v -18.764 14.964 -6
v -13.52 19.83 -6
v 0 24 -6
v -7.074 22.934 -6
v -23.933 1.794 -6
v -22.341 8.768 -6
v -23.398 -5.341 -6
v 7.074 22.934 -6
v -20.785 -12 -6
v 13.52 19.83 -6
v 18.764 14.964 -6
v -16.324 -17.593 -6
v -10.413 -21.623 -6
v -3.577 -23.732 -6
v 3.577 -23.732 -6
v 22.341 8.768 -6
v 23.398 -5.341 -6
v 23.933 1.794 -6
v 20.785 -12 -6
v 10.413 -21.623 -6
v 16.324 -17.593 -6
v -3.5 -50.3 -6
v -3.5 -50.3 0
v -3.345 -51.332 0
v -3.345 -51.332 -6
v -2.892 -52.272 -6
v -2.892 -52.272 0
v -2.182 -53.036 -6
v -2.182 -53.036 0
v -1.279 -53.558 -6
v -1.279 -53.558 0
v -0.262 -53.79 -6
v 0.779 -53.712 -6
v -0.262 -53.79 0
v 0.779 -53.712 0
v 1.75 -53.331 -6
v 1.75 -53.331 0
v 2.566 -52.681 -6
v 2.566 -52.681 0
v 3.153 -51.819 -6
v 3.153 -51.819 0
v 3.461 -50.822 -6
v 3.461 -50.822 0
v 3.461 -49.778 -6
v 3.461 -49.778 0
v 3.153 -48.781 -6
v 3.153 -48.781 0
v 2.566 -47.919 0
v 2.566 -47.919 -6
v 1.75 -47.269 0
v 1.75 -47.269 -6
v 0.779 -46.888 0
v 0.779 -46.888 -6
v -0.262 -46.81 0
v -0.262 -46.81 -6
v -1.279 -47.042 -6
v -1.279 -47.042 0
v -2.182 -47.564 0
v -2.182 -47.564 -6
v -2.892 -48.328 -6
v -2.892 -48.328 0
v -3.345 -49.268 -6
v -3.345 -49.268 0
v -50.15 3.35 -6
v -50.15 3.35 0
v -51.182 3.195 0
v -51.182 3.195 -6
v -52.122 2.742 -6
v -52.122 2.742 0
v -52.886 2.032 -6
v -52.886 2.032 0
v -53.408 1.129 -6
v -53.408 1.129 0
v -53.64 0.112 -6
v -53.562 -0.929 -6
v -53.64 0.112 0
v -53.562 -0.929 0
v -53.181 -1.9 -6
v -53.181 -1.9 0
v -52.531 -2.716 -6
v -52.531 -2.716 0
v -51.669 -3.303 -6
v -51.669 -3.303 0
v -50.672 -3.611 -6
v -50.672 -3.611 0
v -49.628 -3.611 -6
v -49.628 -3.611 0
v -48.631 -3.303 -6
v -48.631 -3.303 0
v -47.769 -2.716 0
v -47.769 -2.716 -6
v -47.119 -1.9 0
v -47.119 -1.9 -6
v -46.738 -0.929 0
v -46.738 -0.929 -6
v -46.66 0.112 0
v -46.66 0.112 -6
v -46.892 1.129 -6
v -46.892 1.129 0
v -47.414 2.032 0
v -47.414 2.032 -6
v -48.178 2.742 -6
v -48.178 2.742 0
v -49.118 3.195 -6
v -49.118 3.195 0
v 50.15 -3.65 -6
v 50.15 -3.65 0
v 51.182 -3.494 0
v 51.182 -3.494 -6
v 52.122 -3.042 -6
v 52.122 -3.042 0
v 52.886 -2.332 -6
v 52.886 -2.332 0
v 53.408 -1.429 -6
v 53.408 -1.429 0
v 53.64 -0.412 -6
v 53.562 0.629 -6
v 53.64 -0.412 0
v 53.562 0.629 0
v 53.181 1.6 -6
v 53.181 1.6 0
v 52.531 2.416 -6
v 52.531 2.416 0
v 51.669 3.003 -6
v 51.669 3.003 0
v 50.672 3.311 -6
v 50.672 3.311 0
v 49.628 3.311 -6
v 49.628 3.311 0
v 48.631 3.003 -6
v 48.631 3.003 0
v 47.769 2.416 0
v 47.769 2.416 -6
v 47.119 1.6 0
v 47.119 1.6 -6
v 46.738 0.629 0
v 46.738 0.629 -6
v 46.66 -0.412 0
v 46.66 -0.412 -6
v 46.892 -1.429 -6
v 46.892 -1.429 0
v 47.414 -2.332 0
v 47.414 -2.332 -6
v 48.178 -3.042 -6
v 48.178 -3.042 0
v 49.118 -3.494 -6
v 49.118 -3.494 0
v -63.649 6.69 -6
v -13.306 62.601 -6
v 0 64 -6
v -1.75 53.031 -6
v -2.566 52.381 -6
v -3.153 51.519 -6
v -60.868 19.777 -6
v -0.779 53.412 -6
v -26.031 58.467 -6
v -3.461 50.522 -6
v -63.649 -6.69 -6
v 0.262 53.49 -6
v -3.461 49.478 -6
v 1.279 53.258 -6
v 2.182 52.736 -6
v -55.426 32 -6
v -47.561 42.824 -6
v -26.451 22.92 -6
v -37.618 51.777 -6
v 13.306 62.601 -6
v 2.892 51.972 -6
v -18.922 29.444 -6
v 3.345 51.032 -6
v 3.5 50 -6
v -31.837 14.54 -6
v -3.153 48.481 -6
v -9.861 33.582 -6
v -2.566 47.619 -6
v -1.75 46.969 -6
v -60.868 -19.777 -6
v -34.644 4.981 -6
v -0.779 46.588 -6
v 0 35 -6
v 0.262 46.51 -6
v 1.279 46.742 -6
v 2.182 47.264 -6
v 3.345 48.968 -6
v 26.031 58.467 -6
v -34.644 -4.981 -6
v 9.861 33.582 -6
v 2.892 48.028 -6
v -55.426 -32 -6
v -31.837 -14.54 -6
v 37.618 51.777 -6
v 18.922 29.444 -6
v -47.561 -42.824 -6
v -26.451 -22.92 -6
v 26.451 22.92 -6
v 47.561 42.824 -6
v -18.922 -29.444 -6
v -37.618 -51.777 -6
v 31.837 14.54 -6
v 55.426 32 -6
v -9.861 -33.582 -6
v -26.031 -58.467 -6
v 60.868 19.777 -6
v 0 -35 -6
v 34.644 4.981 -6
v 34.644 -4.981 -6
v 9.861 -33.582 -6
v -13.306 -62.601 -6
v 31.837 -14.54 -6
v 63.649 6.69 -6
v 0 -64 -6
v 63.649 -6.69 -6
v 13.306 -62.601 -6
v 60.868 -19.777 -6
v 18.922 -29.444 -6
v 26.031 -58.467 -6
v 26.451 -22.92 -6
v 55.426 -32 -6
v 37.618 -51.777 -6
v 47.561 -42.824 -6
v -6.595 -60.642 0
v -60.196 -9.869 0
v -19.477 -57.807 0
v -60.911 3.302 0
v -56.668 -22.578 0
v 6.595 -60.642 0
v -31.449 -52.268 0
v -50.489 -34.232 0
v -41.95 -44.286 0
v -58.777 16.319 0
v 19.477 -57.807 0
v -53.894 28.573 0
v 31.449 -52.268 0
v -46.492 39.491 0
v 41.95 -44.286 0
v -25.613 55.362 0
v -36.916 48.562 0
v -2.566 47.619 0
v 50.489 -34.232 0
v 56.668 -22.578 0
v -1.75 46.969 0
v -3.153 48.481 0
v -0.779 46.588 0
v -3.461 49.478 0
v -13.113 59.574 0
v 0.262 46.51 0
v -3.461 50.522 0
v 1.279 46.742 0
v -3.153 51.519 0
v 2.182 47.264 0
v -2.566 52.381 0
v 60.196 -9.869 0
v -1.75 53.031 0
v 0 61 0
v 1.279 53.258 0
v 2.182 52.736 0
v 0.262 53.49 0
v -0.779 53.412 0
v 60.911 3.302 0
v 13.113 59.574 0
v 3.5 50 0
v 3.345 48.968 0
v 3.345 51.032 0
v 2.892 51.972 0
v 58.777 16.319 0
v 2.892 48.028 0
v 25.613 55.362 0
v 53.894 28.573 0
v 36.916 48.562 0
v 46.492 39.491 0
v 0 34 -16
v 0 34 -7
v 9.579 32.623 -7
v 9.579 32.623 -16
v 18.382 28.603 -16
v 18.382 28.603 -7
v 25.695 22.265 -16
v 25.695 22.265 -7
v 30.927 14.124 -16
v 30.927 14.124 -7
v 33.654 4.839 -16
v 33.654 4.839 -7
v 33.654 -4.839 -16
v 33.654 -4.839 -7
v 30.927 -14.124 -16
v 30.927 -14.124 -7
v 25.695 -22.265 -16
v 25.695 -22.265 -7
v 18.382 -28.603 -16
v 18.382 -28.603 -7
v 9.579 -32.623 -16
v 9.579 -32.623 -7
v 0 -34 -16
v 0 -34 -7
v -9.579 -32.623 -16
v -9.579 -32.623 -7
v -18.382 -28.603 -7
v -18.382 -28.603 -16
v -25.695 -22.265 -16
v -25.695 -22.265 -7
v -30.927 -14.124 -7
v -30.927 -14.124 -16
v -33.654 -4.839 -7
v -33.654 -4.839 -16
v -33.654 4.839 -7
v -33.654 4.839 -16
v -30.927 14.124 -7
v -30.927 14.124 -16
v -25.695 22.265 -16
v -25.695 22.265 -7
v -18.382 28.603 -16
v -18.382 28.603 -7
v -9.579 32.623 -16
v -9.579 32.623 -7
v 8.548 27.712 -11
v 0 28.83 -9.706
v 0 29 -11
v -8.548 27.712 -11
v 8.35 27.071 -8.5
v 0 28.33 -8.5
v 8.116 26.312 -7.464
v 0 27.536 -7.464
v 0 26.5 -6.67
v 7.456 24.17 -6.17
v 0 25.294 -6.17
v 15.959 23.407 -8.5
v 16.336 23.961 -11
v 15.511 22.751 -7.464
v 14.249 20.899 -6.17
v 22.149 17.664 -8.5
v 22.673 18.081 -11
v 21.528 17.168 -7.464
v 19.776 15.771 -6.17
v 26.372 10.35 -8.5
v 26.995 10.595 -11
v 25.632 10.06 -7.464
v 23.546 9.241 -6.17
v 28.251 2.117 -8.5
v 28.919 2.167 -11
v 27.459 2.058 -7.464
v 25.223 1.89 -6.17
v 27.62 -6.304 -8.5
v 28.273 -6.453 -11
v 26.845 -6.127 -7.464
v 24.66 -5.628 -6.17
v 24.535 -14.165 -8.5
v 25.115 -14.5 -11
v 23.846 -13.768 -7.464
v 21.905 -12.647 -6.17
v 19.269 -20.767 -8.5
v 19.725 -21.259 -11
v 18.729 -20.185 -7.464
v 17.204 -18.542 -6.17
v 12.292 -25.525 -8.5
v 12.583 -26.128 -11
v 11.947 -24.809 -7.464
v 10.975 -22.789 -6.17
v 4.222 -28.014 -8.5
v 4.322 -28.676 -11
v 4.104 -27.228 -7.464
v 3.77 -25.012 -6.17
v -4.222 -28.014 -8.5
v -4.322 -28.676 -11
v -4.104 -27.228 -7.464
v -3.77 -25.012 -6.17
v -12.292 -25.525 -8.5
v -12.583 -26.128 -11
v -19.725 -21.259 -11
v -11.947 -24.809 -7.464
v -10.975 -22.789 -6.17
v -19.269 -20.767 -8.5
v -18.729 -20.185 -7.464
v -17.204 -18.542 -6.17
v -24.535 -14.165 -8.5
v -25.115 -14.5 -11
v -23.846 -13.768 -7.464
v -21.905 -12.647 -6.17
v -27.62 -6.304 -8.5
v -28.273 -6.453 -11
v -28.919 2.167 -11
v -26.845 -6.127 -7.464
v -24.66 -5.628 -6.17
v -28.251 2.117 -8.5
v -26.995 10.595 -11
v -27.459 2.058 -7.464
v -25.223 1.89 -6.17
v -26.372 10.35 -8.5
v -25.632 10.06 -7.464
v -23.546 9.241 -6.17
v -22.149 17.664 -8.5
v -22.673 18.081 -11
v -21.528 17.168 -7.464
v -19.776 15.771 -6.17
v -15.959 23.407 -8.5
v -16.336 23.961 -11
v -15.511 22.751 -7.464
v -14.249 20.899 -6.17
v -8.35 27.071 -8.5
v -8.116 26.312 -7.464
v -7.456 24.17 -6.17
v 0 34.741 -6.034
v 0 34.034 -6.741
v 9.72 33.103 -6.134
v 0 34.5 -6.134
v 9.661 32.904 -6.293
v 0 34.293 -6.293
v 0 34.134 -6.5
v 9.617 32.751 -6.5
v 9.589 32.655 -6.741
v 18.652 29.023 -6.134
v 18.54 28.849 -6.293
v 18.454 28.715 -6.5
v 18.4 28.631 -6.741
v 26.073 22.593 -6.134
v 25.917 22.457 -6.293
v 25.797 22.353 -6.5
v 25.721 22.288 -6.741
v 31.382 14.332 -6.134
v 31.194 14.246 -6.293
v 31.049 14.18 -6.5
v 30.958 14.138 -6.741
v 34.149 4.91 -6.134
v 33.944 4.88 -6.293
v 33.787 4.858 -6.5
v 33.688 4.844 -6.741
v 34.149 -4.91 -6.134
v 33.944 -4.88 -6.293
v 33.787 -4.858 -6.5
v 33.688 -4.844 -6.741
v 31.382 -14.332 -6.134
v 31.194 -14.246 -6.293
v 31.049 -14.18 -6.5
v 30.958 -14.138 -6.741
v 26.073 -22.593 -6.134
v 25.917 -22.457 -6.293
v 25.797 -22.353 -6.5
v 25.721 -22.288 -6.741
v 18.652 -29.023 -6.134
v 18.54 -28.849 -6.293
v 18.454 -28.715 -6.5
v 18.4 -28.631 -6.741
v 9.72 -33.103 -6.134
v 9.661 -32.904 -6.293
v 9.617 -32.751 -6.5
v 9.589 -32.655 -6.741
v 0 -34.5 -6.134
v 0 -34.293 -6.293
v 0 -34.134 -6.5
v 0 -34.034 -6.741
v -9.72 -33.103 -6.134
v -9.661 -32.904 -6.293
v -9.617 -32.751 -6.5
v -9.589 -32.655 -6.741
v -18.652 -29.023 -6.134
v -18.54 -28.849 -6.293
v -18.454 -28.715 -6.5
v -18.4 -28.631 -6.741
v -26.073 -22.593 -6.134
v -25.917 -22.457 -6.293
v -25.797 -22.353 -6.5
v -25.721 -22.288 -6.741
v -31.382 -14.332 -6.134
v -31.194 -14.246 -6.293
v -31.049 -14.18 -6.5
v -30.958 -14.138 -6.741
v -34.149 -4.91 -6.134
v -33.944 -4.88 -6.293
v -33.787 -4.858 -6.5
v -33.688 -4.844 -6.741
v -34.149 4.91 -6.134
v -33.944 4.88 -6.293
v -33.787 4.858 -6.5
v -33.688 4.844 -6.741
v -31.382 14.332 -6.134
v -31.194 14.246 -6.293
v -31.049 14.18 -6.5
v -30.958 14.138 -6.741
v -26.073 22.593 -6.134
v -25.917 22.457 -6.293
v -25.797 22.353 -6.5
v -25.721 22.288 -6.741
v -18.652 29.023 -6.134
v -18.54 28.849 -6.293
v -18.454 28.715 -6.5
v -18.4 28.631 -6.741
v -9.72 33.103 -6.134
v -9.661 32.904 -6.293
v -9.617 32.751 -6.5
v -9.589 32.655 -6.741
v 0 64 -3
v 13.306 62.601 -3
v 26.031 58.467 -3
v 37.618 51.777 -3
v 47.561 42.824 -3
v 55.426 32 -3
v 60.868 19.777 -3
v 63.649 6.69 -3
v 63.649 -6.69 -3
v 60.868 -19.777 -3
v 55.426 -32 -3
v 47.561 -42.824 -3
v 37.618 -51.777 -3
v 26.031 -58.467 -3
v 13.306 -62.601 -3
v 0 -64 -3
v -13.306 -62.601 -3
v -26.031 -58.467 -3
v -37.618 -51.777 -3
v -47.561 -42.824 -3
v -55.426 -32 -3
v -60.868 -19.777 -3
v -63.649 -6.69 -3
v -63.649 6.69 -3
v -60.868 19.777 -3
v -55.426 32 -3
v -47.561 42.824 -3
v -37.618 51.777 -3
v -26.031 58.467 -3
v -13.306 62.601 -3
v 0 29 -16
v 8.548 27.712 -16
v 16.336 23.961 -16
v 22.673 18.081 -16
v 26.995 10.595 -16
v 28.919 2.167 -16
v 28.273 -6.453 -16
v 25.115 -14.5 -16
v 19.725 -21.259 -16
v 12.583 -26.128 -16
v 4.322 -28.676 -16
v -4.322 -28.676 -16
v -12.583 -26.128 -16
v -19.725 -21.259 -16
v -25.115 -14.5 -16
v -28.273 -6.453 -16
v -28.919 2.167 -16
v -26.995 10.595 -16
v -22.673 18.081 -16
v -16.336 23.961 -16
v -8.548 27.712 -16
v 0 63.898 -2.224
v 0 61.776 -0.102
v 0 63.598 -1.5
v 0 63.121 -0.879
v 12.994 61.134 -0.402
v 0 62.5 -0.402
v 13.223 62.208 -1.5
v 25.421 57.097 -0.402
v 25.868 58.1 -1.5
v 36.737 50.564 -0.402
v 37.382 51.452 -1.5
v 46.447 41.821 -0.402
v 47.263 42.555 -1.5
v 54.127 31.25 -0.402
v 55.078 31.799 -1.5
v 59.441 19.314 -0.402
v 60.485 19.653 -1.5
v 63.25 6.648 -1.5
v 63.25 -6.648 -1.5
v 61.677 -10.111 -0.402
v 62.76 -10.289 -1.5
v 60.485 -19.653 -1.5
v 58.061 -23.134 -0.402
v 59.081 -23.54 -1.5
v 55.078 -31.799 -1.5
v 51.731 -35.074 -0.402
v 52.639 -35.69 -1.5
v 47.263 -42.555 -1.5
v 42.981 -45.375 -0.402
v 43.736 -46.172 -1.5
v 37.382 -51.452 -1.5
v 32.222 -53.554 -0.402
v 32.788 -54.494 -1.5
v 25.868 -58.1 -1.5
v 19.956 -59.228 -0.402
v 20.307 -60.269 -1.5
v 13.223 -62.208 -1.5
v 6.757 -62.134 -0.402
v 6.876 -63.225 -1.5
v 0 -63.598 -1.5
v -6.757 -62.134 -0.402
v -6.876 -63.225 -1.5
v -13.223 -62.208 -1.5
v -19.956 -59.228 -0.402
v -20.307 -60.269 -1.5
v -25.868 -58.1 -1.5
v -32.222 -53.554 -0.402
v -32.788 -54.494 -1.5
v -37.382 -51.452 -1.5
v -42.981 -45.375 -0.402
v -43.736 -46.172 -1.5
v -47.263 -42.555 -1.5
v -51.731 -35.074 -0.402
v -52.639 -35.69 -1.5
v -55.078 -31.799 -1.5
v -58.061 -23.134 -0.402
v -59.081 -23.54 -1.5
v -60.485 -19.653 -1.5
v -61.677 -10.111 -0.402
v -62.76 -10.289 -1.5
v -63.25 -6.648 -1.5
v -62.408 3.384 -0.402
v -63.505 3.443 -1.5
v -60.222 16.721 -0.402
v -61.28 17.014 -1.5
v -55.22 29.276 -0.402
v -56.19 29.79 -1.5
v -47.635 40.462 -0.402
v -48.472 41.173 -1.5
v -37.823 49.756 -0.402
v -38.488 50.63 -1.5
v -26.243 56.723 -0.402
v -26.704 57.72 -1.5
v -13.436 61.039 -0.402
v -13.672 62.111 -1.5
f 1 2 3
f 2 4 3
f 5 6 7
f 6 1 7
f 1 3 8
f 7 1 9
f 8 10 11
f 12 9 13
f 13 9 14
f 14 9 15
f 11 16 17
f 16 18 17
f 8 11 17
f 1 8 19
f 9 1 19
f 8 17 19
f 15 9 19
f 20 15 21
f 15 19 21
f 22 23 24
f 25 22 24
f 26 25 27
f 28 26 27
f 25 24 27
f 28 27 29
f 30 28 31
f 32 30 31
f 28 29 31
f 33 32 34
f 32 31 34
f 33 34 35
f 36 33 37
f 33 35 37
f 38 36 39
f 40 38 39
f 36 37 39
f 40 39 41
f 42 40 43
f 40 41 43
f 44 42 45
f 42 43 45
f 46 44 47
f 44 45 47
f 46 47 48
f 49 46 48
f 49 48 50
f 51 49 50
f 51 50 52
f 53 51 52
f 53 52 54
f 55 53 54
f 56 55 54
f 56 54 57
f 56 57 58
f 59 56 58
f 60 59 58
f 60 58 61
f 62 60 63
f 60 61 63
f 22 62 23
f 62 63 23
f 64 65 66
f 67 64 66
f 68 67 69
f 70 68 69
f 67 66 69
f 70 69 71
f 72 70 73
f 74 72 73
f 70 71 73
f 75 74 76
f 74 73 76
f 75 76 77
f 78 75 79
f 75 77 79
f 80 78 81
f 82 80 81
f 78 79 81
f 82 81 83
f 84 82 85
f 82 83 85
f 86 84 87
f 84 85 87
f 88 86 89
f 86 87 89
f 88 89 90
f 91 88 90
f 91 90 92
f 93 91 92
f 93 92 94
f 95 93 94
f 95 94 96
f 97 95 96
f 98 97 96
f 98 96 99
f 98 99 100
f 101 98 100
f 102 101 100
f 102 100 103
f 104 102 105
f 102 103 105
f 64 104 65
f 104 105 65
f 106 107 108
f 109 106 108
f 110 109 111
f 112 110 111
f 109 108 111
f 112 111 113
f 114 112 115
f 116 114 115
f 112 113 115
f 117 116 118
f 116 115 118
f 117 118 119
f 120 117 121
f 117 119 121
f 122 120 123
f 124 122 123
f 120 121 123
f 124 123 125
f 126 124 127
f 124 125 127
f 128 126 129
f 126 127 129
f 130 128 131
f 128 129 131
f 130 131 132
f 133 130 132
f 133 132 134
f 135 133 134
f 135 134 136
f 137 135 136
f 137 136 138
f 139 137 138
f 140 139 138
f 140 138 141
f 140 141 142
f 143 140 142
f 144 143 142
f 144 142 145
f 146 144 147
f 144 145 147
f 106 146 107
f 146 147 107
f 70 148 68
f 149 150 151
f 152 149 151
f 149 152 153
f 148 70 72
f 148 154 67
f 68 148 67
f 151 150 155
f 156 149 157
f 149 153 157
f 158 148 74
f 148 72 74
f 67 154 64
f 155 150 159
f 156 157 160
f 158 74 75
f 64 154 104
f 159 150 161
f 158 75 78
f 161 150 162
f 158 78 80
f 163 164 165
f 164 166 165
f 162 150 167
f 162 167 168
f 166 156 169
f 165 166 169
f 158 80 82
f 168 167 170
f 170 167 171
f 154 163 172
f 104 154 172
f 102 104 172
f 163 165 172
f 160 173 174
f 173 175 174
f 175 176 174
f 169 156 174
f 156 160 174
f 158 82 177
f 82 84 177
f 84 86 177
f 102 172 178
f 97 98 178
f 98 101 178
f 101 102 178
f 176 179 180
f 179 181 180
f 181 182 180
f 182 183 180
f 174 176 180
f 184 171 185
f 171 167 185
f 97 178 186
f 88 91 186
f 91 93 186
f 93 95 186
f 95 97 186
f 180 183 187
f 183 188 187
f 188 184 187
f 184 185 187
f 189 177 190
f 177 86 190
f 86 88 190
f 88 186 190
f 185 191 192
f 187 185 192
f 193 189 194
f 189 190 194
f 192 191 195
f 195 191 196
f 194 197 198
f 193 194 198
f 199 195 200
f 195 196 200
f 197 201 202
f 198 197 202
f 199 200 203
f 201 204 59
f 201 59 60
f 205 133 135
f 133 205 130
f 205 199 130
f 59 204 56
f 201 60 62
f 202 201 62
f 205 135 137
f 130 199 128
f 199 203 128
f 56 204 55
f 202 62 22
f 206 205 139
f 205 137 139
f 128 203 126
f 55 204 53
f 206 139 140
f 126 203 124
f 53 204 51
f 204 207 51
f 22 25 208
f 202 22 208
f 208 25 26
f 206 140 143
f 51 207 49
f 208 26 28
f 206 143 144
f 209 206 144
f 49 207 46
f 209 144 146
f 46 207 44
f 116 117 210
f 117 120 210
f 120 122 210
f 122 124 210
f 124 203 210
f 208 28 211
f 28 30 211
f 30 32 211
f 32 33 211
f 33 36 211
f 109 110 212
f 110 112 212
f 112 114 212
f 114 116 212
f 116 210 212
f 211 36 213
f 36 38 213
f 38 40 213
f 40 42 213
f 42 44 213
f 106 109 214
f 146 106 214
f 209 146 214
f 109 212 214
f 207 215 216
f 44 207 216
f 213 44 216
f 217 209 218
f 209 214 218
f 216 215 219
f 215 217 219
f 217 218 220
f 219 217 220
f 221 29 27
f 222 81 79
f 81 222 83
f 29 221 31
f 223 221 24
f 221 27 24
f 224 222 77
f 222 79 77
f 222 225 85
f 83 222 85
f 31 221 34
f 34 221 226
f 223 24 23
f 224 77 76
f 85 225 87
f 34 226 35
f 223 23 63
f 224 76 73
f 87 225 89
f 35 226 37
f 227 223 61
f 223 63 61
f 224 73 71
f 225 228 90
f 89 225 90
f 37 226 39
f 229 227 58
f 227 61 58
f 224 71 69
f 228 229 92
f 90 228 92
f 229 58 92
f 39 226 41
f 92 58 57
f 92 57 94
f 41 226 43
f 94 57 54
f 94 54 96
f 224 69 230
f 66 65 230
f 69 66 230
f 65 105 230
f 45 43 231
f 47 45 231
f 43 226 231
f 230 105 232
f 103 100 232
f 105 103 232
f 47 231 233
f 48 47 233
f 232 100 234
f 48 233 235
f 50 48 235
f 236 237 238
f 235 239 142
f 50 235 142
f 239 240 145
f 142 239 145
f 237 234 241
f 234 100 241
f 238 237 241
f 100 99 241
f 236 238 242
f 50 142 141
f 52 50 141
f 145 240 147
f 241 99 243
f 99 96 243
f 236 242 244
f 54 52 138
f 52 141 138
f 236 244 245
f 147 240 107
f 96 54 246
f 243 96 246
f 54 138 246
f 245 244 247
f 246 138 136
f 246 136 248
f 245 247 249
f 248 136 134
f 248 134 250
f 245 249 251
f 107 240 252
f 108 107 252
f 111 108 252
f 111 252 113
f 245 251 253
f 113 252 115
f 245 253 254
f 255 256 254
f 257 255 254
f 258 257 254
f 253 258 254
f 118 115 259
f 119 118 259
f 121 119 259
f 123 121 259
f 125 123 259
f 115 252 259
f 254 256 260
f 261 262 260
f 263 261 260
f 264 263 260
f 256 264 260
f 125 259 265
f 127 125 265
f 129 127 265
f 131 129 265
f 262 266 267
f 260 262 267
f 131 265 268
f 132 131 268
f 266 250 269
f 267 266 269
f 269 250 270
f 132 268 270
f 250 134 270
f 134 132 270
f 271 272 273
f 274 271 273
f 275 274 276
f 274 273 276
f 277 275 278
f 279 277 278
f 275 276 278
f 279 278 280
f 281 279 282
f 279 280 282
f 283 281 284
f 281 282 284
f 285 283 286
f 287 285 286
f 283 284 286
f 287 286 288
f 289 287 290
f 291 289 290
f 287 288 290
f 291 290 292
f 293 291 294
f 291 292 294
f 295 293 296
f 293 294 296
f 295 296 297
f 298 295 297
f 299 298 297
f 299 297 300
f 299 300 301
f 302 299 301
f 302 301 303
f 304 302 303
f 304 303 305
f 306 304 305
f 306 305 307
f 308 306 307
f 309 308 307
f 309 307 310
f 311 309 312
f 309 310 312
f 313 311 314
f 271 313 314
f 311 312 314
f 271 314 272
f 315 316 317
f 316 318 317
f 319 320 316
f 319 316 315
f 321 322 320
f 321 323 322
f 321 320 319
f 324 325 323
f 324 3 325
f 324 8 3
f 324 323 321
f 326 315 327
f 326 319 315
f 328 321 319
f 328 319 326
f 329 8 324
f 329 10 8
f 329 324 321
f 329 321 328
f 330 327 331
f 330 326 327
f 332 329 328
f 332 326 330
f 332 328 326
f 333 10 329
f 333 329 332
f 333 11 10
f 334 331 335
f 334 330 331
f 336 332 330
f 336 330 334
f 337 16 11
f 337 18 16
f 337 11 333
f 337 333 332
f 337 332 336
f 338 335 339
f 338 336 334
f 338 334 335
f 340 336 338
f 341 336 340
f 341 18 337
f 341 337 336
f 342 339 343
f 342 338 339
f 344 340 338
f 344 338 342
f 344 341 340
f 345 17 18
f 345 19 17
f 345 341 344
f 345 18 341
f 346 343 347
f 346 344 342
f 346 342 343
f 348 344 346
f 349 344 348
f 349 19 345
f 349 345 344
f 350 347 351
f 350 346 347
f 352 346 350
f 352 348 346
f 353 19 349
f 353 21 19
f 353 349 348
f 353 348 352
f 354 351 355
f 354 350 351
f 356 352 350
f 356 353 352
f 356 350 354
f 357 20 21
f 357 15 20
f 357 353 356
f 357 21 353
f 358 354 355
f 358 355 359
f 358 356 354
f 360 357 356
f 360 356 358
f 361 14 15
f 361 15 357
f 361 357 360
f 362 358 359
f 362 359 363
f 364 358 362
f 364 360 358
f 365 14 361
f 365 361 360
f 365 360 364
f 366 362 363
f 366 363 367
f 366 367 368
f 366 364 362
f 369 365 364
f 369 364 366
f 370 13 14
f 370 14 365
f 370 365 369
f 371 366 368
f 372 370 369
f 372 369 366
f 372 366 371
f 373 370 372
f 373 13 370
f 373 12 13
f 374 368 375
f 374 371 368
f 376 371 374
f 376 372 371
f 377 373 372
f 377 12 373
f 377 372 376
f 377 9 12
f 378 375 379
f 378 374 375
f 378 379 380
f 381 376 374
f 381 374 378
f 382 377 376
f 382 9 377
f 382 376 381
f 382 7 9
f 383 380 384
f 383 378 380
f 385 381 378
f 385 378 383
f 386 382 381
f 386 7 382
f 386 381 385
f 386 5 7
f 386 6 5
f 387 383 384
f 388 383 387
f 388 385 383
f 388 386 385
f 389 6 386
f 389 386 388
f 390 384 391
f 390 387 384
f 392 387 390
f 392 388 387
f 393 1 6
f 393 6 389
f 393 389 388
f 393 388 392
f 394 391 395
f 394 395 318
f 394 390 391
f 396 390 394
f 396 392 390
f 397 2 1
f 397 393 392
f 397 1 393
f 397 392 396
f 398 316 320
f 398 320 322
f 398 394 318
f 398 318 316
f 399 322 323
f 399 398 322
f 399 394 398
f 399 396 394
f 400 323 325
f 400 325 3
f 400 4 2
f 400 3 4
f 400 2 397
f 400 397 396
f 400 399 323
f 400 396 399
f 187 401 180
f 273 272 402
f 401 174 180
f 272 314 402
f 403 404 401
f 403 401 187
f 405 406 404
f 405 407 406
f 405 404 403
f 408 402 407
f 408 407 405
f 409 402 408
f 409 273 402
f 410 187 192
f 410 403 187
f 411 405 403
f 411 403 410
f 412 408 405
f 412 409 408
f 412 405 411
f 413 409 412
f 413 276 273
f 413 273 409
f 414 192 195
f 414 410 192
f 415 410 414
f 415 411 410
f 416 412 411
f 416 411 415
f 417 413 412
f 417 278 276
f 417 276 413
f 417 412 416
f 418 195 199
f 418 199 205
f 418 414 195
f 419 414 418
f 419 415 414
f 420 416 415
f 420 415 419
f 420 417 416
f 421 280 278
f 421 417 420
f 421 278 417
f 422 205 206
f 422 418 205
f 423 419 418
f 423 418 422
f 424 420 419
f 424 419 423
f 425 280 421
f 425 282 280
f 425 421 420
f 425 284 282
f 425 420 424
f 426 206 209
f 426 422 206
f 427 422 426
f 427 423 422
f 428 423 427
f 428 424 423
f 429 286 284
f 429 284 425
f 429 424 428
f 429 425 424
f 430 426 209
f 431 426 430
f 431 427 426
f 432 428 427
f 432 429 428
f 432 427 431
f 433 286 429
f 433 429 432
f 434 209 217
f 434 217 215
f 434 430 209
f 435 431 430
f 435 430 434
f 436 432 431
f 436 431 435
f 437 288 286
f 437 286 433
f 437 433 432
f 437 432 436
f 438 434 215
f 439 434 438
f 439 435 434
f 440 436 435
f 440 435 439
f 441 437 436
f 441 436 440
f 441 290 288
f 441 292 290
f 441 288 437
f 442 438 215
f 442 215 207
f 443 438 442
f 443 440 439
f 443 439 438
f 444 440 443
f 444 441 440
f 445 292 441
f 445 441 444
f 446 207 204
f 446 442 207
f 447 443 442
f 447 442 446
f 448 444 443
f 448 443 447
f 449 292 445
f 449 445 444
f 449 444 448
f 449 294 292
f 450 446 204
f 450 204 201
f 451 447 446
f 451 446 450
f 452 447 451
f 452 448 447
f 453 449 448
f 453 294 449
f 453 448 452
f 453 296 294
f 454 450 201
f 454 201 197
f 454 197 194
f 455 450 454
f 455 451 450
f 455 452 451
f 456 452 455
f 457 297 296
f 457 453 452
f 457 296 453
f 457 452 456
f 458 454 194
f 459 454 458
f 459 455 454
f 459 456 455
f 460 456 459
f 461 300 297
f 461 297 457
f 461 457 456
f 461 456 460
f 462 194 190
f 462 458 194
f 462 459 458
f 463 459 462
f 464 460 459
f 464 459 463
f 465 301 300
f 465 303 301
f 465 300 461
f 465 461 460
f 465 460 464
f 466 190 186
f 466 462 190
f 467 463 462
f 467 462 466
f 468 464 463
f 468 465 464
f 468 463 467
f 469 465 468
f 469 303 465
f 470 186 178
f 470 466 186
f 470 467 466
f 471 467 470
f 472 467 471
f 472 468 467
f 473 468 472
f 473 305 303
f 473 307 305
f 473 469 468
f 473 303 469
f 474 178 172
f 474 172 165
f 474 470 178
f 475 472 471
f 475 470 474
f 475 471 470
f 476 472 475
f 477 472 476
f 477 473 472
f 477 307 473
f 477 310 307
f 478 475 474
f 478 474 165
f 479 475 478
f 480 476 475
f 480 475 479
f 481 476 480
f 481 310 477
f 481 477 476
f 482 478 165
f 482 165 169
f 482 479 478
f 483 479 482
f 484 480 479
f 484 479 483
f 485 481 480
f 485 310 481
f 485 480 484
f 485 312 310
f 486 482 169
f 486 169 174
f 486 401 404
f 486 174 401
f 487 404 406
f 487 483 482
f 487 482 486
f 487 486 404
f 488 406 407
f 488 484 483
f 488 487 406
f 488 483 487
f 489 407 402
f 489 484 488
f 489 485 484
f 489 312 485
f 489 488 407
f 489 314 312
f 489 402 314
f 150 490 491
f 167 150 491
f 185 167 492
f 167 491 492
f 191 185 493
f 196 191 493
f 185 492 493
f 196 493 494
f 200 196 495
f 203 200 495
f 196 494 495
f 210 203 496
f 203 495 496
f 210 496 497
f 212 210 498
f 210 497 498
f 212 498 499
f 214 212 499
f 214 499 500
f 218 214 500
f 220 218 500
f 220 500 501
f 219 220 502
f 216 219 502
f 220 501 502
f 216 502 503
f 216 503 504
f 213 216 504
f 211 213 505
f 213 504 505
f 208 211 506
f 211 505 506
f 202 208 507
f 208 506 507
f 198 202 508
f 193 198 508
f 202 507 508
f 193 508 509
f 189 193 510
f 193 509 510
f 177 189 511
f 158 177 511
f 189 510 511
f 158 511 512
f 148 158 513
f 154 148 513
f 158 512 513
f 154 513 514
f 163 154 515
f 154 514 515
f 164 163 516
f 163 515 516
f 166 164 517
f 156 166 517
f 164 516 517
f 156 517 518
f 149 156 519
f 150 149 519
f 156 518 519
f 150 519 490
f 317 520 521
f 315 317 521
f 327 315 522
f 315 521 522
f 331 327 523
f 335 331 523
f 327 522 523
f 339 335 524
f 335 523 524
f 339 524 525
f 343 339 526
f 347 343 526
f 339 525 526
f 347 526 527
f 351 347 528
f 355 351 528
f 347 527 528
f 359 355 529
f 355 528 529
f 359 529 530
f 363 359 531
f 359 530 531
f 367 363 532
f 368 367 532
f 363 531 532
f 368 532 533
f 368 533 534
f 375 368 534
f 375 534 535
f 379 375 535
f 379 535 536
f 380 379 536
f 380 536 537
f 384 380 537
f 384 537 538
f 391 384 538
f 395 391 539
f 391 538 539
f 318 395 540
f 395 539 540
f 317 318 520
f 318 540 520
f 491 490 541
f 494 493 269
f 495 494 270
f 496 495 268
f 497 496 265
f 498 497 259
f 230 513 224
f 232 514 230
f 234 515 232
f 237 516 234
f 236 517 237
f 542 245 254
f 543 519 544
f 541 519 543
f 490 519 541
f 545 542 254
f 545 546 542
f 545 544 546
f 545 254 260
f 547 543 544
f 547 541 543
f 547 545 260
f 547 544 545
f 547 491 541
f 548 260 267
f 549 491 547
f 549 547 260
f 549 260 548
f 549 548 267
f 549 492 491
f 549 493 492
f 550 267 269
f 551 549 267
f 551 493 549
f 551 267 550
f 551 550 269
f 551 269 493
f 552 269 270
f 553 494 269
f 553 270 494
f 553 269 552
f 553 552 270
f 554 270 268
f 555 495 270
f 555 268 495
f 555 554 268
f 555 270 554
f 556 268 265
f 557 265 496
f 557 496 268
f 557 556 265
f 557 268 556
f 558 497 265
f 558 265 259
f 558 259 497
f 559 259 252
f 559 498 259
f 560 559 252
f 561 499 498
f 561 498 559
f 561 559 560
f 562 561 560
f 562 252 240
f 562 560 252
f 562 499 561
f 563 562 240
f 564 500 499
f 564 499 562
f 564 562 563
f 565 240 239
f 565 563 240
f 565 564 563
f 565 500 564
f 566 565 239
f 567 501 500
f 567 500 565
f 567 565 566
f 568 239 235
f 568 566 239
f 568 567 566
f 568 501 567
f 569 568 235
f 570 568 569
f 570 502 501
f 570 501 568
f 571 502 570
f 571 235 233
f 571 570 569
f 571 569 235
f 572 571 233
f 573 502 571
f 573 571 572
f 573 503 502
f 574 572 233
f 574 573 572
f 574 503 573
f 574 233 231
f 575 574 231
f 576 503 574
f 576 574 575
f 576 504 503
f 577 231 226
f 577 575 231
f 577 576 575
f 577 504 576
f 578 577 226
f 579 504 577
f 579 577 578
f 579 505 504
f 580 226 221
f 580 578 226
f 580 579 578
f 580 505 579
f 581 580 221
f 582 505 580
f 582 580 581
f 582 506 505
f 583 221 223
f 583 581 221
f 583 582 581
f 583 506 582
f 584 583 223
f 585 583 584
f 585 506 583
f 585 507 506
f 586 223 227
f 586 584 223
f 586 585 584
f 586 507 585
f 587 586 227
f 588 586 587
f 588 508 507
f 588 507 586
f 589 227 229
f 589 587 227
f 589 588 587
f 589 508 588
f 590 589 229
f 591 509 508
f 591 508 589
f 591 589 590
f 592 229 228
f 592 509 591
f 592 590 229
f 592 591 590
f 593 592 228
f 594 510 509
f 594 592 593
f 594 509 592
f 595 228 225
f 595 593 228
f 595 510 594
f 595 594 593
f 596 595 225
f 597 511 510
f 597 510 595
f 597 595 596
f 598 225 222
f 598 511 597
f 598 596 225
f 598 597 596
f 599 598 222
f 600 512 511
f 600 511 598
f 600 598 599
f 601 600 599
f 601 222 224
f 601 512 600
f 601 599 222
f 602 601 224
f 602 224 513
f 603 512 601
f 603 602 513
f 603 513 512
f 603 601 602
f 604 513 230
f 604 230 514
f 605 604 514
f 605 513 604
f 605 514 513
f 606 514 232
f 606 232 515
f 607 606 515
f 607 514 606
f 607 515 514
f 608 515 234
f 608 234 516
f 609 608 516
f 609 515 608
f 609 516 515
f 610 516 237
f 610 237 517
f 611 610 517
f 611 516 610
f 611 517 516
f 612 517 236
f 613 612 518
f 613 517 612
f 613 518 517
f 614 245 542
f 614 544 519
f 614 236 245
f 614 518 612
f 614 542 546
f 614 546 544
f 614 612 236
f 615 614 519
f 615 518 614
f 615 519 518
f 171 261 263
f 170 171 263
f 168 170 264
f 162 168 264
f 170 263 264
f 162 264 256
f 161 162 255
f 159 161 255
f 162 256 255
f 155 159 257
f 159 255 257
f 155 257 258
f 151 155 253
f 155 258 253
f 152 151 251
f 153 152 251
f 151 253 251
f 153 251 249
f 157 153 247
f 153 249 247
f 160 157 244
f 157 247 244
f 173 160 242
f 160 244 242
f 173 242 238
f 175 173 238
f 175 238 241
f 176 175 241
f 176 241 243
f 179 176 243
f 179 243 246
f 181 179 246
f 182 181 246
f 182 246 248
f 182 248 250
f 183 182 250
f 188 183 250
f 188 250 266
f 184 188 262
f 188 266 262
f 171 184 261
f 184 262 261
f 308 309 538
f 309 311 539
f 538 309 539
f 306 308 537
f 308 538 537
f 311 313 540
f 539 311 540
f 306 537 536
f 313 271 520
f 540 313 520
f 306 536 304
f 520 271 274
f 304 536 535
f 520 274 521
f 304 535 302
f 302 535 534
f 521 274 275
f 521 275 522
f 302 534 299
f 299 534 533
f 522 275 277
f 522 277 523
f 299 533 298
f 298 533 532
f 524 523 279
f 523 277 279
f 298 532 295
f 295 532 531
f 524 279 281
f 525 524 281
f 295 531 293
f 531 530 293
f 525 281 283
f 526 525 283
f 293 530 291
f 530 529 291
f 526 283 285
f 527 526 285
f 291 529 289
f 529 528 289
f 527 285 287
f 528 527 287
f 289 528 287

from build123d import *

# Parameters (mm, degrees)
SKICA2_R                 = 3.5
ODEBRAT_VYSUNUT_M1_DEPTH = 6
KRUHOV_POLE1_COUNT       = 4
ZAOBLIT1_R               = 3
ZAOBLIT2_R               = 1
ZAOBLIT3_R               = 5


with BuildPart() as part:
    # Skica1 → Rotovat1 (revolve)
    with BuildSketch(Plane(origin=(0, 0, 0), x_dir=(0, 0, -1), z_dir=(1, 0, 0))):
        Polygon((0, 64), (0, 0), (6, 0), (6, 29), (16, 29), (16, 34), (6, 34), (6, 64), align=None)
    revolve(axis=Axis((0, 0, 30.782343988), (0, 0, -1)))

    # Skica2 → Odebrat vysunutím1 (cut)
    with BuildSketch(Plane.XY):
        with Locations((0, 50)):
            Circle(SKICA2_R)
    odebrat_vysunut_m1 = extrude(amount=-ODEBRAT_VYSUNUT_M1_DEPTH, mode=Mode.SUBTRACT)

    # Kruhové pole1: Odebrat vysunutím1 ×4 about axis
    kruhov_pole1_axis = Axis((0, -0.149984695, 0), (0, 0, 1))
    for i in range(1, KRUHOV_POLE1_COUNT):
        add(odebrat_vysunut_m1.rotate(kruhov_pole1_axis, i * 360 / KRUHOV_POLE1_COUNT), mode=Mode.SUBTRACT)

    # Zaoblit1
    zaoblit1_edges = [part.edges().sort_by_distance(p)[0] for p in [
        (0, -64, 0),
    ]]
    fillet(zaoblit1_edges, radius=ZAOBLIT1_R)

    # Zaoblit2
    zaoblit2_edges = [part.edges().sort_by_distance(p)[0] for p in [
        (0, -34, -6),
    ]]
    fillet(zaoblit2_edges, radius=ZAOBLIT2_R)

    # Zaoblit3
    zaoblit3_edges = [part.edges().sort_by_distance(p)[0] for p in [
        (0, -29, -6),
    ]]
    fillet(zaoblit3_edges, radius=ZAOBLIT3_R)


solid = part.part
